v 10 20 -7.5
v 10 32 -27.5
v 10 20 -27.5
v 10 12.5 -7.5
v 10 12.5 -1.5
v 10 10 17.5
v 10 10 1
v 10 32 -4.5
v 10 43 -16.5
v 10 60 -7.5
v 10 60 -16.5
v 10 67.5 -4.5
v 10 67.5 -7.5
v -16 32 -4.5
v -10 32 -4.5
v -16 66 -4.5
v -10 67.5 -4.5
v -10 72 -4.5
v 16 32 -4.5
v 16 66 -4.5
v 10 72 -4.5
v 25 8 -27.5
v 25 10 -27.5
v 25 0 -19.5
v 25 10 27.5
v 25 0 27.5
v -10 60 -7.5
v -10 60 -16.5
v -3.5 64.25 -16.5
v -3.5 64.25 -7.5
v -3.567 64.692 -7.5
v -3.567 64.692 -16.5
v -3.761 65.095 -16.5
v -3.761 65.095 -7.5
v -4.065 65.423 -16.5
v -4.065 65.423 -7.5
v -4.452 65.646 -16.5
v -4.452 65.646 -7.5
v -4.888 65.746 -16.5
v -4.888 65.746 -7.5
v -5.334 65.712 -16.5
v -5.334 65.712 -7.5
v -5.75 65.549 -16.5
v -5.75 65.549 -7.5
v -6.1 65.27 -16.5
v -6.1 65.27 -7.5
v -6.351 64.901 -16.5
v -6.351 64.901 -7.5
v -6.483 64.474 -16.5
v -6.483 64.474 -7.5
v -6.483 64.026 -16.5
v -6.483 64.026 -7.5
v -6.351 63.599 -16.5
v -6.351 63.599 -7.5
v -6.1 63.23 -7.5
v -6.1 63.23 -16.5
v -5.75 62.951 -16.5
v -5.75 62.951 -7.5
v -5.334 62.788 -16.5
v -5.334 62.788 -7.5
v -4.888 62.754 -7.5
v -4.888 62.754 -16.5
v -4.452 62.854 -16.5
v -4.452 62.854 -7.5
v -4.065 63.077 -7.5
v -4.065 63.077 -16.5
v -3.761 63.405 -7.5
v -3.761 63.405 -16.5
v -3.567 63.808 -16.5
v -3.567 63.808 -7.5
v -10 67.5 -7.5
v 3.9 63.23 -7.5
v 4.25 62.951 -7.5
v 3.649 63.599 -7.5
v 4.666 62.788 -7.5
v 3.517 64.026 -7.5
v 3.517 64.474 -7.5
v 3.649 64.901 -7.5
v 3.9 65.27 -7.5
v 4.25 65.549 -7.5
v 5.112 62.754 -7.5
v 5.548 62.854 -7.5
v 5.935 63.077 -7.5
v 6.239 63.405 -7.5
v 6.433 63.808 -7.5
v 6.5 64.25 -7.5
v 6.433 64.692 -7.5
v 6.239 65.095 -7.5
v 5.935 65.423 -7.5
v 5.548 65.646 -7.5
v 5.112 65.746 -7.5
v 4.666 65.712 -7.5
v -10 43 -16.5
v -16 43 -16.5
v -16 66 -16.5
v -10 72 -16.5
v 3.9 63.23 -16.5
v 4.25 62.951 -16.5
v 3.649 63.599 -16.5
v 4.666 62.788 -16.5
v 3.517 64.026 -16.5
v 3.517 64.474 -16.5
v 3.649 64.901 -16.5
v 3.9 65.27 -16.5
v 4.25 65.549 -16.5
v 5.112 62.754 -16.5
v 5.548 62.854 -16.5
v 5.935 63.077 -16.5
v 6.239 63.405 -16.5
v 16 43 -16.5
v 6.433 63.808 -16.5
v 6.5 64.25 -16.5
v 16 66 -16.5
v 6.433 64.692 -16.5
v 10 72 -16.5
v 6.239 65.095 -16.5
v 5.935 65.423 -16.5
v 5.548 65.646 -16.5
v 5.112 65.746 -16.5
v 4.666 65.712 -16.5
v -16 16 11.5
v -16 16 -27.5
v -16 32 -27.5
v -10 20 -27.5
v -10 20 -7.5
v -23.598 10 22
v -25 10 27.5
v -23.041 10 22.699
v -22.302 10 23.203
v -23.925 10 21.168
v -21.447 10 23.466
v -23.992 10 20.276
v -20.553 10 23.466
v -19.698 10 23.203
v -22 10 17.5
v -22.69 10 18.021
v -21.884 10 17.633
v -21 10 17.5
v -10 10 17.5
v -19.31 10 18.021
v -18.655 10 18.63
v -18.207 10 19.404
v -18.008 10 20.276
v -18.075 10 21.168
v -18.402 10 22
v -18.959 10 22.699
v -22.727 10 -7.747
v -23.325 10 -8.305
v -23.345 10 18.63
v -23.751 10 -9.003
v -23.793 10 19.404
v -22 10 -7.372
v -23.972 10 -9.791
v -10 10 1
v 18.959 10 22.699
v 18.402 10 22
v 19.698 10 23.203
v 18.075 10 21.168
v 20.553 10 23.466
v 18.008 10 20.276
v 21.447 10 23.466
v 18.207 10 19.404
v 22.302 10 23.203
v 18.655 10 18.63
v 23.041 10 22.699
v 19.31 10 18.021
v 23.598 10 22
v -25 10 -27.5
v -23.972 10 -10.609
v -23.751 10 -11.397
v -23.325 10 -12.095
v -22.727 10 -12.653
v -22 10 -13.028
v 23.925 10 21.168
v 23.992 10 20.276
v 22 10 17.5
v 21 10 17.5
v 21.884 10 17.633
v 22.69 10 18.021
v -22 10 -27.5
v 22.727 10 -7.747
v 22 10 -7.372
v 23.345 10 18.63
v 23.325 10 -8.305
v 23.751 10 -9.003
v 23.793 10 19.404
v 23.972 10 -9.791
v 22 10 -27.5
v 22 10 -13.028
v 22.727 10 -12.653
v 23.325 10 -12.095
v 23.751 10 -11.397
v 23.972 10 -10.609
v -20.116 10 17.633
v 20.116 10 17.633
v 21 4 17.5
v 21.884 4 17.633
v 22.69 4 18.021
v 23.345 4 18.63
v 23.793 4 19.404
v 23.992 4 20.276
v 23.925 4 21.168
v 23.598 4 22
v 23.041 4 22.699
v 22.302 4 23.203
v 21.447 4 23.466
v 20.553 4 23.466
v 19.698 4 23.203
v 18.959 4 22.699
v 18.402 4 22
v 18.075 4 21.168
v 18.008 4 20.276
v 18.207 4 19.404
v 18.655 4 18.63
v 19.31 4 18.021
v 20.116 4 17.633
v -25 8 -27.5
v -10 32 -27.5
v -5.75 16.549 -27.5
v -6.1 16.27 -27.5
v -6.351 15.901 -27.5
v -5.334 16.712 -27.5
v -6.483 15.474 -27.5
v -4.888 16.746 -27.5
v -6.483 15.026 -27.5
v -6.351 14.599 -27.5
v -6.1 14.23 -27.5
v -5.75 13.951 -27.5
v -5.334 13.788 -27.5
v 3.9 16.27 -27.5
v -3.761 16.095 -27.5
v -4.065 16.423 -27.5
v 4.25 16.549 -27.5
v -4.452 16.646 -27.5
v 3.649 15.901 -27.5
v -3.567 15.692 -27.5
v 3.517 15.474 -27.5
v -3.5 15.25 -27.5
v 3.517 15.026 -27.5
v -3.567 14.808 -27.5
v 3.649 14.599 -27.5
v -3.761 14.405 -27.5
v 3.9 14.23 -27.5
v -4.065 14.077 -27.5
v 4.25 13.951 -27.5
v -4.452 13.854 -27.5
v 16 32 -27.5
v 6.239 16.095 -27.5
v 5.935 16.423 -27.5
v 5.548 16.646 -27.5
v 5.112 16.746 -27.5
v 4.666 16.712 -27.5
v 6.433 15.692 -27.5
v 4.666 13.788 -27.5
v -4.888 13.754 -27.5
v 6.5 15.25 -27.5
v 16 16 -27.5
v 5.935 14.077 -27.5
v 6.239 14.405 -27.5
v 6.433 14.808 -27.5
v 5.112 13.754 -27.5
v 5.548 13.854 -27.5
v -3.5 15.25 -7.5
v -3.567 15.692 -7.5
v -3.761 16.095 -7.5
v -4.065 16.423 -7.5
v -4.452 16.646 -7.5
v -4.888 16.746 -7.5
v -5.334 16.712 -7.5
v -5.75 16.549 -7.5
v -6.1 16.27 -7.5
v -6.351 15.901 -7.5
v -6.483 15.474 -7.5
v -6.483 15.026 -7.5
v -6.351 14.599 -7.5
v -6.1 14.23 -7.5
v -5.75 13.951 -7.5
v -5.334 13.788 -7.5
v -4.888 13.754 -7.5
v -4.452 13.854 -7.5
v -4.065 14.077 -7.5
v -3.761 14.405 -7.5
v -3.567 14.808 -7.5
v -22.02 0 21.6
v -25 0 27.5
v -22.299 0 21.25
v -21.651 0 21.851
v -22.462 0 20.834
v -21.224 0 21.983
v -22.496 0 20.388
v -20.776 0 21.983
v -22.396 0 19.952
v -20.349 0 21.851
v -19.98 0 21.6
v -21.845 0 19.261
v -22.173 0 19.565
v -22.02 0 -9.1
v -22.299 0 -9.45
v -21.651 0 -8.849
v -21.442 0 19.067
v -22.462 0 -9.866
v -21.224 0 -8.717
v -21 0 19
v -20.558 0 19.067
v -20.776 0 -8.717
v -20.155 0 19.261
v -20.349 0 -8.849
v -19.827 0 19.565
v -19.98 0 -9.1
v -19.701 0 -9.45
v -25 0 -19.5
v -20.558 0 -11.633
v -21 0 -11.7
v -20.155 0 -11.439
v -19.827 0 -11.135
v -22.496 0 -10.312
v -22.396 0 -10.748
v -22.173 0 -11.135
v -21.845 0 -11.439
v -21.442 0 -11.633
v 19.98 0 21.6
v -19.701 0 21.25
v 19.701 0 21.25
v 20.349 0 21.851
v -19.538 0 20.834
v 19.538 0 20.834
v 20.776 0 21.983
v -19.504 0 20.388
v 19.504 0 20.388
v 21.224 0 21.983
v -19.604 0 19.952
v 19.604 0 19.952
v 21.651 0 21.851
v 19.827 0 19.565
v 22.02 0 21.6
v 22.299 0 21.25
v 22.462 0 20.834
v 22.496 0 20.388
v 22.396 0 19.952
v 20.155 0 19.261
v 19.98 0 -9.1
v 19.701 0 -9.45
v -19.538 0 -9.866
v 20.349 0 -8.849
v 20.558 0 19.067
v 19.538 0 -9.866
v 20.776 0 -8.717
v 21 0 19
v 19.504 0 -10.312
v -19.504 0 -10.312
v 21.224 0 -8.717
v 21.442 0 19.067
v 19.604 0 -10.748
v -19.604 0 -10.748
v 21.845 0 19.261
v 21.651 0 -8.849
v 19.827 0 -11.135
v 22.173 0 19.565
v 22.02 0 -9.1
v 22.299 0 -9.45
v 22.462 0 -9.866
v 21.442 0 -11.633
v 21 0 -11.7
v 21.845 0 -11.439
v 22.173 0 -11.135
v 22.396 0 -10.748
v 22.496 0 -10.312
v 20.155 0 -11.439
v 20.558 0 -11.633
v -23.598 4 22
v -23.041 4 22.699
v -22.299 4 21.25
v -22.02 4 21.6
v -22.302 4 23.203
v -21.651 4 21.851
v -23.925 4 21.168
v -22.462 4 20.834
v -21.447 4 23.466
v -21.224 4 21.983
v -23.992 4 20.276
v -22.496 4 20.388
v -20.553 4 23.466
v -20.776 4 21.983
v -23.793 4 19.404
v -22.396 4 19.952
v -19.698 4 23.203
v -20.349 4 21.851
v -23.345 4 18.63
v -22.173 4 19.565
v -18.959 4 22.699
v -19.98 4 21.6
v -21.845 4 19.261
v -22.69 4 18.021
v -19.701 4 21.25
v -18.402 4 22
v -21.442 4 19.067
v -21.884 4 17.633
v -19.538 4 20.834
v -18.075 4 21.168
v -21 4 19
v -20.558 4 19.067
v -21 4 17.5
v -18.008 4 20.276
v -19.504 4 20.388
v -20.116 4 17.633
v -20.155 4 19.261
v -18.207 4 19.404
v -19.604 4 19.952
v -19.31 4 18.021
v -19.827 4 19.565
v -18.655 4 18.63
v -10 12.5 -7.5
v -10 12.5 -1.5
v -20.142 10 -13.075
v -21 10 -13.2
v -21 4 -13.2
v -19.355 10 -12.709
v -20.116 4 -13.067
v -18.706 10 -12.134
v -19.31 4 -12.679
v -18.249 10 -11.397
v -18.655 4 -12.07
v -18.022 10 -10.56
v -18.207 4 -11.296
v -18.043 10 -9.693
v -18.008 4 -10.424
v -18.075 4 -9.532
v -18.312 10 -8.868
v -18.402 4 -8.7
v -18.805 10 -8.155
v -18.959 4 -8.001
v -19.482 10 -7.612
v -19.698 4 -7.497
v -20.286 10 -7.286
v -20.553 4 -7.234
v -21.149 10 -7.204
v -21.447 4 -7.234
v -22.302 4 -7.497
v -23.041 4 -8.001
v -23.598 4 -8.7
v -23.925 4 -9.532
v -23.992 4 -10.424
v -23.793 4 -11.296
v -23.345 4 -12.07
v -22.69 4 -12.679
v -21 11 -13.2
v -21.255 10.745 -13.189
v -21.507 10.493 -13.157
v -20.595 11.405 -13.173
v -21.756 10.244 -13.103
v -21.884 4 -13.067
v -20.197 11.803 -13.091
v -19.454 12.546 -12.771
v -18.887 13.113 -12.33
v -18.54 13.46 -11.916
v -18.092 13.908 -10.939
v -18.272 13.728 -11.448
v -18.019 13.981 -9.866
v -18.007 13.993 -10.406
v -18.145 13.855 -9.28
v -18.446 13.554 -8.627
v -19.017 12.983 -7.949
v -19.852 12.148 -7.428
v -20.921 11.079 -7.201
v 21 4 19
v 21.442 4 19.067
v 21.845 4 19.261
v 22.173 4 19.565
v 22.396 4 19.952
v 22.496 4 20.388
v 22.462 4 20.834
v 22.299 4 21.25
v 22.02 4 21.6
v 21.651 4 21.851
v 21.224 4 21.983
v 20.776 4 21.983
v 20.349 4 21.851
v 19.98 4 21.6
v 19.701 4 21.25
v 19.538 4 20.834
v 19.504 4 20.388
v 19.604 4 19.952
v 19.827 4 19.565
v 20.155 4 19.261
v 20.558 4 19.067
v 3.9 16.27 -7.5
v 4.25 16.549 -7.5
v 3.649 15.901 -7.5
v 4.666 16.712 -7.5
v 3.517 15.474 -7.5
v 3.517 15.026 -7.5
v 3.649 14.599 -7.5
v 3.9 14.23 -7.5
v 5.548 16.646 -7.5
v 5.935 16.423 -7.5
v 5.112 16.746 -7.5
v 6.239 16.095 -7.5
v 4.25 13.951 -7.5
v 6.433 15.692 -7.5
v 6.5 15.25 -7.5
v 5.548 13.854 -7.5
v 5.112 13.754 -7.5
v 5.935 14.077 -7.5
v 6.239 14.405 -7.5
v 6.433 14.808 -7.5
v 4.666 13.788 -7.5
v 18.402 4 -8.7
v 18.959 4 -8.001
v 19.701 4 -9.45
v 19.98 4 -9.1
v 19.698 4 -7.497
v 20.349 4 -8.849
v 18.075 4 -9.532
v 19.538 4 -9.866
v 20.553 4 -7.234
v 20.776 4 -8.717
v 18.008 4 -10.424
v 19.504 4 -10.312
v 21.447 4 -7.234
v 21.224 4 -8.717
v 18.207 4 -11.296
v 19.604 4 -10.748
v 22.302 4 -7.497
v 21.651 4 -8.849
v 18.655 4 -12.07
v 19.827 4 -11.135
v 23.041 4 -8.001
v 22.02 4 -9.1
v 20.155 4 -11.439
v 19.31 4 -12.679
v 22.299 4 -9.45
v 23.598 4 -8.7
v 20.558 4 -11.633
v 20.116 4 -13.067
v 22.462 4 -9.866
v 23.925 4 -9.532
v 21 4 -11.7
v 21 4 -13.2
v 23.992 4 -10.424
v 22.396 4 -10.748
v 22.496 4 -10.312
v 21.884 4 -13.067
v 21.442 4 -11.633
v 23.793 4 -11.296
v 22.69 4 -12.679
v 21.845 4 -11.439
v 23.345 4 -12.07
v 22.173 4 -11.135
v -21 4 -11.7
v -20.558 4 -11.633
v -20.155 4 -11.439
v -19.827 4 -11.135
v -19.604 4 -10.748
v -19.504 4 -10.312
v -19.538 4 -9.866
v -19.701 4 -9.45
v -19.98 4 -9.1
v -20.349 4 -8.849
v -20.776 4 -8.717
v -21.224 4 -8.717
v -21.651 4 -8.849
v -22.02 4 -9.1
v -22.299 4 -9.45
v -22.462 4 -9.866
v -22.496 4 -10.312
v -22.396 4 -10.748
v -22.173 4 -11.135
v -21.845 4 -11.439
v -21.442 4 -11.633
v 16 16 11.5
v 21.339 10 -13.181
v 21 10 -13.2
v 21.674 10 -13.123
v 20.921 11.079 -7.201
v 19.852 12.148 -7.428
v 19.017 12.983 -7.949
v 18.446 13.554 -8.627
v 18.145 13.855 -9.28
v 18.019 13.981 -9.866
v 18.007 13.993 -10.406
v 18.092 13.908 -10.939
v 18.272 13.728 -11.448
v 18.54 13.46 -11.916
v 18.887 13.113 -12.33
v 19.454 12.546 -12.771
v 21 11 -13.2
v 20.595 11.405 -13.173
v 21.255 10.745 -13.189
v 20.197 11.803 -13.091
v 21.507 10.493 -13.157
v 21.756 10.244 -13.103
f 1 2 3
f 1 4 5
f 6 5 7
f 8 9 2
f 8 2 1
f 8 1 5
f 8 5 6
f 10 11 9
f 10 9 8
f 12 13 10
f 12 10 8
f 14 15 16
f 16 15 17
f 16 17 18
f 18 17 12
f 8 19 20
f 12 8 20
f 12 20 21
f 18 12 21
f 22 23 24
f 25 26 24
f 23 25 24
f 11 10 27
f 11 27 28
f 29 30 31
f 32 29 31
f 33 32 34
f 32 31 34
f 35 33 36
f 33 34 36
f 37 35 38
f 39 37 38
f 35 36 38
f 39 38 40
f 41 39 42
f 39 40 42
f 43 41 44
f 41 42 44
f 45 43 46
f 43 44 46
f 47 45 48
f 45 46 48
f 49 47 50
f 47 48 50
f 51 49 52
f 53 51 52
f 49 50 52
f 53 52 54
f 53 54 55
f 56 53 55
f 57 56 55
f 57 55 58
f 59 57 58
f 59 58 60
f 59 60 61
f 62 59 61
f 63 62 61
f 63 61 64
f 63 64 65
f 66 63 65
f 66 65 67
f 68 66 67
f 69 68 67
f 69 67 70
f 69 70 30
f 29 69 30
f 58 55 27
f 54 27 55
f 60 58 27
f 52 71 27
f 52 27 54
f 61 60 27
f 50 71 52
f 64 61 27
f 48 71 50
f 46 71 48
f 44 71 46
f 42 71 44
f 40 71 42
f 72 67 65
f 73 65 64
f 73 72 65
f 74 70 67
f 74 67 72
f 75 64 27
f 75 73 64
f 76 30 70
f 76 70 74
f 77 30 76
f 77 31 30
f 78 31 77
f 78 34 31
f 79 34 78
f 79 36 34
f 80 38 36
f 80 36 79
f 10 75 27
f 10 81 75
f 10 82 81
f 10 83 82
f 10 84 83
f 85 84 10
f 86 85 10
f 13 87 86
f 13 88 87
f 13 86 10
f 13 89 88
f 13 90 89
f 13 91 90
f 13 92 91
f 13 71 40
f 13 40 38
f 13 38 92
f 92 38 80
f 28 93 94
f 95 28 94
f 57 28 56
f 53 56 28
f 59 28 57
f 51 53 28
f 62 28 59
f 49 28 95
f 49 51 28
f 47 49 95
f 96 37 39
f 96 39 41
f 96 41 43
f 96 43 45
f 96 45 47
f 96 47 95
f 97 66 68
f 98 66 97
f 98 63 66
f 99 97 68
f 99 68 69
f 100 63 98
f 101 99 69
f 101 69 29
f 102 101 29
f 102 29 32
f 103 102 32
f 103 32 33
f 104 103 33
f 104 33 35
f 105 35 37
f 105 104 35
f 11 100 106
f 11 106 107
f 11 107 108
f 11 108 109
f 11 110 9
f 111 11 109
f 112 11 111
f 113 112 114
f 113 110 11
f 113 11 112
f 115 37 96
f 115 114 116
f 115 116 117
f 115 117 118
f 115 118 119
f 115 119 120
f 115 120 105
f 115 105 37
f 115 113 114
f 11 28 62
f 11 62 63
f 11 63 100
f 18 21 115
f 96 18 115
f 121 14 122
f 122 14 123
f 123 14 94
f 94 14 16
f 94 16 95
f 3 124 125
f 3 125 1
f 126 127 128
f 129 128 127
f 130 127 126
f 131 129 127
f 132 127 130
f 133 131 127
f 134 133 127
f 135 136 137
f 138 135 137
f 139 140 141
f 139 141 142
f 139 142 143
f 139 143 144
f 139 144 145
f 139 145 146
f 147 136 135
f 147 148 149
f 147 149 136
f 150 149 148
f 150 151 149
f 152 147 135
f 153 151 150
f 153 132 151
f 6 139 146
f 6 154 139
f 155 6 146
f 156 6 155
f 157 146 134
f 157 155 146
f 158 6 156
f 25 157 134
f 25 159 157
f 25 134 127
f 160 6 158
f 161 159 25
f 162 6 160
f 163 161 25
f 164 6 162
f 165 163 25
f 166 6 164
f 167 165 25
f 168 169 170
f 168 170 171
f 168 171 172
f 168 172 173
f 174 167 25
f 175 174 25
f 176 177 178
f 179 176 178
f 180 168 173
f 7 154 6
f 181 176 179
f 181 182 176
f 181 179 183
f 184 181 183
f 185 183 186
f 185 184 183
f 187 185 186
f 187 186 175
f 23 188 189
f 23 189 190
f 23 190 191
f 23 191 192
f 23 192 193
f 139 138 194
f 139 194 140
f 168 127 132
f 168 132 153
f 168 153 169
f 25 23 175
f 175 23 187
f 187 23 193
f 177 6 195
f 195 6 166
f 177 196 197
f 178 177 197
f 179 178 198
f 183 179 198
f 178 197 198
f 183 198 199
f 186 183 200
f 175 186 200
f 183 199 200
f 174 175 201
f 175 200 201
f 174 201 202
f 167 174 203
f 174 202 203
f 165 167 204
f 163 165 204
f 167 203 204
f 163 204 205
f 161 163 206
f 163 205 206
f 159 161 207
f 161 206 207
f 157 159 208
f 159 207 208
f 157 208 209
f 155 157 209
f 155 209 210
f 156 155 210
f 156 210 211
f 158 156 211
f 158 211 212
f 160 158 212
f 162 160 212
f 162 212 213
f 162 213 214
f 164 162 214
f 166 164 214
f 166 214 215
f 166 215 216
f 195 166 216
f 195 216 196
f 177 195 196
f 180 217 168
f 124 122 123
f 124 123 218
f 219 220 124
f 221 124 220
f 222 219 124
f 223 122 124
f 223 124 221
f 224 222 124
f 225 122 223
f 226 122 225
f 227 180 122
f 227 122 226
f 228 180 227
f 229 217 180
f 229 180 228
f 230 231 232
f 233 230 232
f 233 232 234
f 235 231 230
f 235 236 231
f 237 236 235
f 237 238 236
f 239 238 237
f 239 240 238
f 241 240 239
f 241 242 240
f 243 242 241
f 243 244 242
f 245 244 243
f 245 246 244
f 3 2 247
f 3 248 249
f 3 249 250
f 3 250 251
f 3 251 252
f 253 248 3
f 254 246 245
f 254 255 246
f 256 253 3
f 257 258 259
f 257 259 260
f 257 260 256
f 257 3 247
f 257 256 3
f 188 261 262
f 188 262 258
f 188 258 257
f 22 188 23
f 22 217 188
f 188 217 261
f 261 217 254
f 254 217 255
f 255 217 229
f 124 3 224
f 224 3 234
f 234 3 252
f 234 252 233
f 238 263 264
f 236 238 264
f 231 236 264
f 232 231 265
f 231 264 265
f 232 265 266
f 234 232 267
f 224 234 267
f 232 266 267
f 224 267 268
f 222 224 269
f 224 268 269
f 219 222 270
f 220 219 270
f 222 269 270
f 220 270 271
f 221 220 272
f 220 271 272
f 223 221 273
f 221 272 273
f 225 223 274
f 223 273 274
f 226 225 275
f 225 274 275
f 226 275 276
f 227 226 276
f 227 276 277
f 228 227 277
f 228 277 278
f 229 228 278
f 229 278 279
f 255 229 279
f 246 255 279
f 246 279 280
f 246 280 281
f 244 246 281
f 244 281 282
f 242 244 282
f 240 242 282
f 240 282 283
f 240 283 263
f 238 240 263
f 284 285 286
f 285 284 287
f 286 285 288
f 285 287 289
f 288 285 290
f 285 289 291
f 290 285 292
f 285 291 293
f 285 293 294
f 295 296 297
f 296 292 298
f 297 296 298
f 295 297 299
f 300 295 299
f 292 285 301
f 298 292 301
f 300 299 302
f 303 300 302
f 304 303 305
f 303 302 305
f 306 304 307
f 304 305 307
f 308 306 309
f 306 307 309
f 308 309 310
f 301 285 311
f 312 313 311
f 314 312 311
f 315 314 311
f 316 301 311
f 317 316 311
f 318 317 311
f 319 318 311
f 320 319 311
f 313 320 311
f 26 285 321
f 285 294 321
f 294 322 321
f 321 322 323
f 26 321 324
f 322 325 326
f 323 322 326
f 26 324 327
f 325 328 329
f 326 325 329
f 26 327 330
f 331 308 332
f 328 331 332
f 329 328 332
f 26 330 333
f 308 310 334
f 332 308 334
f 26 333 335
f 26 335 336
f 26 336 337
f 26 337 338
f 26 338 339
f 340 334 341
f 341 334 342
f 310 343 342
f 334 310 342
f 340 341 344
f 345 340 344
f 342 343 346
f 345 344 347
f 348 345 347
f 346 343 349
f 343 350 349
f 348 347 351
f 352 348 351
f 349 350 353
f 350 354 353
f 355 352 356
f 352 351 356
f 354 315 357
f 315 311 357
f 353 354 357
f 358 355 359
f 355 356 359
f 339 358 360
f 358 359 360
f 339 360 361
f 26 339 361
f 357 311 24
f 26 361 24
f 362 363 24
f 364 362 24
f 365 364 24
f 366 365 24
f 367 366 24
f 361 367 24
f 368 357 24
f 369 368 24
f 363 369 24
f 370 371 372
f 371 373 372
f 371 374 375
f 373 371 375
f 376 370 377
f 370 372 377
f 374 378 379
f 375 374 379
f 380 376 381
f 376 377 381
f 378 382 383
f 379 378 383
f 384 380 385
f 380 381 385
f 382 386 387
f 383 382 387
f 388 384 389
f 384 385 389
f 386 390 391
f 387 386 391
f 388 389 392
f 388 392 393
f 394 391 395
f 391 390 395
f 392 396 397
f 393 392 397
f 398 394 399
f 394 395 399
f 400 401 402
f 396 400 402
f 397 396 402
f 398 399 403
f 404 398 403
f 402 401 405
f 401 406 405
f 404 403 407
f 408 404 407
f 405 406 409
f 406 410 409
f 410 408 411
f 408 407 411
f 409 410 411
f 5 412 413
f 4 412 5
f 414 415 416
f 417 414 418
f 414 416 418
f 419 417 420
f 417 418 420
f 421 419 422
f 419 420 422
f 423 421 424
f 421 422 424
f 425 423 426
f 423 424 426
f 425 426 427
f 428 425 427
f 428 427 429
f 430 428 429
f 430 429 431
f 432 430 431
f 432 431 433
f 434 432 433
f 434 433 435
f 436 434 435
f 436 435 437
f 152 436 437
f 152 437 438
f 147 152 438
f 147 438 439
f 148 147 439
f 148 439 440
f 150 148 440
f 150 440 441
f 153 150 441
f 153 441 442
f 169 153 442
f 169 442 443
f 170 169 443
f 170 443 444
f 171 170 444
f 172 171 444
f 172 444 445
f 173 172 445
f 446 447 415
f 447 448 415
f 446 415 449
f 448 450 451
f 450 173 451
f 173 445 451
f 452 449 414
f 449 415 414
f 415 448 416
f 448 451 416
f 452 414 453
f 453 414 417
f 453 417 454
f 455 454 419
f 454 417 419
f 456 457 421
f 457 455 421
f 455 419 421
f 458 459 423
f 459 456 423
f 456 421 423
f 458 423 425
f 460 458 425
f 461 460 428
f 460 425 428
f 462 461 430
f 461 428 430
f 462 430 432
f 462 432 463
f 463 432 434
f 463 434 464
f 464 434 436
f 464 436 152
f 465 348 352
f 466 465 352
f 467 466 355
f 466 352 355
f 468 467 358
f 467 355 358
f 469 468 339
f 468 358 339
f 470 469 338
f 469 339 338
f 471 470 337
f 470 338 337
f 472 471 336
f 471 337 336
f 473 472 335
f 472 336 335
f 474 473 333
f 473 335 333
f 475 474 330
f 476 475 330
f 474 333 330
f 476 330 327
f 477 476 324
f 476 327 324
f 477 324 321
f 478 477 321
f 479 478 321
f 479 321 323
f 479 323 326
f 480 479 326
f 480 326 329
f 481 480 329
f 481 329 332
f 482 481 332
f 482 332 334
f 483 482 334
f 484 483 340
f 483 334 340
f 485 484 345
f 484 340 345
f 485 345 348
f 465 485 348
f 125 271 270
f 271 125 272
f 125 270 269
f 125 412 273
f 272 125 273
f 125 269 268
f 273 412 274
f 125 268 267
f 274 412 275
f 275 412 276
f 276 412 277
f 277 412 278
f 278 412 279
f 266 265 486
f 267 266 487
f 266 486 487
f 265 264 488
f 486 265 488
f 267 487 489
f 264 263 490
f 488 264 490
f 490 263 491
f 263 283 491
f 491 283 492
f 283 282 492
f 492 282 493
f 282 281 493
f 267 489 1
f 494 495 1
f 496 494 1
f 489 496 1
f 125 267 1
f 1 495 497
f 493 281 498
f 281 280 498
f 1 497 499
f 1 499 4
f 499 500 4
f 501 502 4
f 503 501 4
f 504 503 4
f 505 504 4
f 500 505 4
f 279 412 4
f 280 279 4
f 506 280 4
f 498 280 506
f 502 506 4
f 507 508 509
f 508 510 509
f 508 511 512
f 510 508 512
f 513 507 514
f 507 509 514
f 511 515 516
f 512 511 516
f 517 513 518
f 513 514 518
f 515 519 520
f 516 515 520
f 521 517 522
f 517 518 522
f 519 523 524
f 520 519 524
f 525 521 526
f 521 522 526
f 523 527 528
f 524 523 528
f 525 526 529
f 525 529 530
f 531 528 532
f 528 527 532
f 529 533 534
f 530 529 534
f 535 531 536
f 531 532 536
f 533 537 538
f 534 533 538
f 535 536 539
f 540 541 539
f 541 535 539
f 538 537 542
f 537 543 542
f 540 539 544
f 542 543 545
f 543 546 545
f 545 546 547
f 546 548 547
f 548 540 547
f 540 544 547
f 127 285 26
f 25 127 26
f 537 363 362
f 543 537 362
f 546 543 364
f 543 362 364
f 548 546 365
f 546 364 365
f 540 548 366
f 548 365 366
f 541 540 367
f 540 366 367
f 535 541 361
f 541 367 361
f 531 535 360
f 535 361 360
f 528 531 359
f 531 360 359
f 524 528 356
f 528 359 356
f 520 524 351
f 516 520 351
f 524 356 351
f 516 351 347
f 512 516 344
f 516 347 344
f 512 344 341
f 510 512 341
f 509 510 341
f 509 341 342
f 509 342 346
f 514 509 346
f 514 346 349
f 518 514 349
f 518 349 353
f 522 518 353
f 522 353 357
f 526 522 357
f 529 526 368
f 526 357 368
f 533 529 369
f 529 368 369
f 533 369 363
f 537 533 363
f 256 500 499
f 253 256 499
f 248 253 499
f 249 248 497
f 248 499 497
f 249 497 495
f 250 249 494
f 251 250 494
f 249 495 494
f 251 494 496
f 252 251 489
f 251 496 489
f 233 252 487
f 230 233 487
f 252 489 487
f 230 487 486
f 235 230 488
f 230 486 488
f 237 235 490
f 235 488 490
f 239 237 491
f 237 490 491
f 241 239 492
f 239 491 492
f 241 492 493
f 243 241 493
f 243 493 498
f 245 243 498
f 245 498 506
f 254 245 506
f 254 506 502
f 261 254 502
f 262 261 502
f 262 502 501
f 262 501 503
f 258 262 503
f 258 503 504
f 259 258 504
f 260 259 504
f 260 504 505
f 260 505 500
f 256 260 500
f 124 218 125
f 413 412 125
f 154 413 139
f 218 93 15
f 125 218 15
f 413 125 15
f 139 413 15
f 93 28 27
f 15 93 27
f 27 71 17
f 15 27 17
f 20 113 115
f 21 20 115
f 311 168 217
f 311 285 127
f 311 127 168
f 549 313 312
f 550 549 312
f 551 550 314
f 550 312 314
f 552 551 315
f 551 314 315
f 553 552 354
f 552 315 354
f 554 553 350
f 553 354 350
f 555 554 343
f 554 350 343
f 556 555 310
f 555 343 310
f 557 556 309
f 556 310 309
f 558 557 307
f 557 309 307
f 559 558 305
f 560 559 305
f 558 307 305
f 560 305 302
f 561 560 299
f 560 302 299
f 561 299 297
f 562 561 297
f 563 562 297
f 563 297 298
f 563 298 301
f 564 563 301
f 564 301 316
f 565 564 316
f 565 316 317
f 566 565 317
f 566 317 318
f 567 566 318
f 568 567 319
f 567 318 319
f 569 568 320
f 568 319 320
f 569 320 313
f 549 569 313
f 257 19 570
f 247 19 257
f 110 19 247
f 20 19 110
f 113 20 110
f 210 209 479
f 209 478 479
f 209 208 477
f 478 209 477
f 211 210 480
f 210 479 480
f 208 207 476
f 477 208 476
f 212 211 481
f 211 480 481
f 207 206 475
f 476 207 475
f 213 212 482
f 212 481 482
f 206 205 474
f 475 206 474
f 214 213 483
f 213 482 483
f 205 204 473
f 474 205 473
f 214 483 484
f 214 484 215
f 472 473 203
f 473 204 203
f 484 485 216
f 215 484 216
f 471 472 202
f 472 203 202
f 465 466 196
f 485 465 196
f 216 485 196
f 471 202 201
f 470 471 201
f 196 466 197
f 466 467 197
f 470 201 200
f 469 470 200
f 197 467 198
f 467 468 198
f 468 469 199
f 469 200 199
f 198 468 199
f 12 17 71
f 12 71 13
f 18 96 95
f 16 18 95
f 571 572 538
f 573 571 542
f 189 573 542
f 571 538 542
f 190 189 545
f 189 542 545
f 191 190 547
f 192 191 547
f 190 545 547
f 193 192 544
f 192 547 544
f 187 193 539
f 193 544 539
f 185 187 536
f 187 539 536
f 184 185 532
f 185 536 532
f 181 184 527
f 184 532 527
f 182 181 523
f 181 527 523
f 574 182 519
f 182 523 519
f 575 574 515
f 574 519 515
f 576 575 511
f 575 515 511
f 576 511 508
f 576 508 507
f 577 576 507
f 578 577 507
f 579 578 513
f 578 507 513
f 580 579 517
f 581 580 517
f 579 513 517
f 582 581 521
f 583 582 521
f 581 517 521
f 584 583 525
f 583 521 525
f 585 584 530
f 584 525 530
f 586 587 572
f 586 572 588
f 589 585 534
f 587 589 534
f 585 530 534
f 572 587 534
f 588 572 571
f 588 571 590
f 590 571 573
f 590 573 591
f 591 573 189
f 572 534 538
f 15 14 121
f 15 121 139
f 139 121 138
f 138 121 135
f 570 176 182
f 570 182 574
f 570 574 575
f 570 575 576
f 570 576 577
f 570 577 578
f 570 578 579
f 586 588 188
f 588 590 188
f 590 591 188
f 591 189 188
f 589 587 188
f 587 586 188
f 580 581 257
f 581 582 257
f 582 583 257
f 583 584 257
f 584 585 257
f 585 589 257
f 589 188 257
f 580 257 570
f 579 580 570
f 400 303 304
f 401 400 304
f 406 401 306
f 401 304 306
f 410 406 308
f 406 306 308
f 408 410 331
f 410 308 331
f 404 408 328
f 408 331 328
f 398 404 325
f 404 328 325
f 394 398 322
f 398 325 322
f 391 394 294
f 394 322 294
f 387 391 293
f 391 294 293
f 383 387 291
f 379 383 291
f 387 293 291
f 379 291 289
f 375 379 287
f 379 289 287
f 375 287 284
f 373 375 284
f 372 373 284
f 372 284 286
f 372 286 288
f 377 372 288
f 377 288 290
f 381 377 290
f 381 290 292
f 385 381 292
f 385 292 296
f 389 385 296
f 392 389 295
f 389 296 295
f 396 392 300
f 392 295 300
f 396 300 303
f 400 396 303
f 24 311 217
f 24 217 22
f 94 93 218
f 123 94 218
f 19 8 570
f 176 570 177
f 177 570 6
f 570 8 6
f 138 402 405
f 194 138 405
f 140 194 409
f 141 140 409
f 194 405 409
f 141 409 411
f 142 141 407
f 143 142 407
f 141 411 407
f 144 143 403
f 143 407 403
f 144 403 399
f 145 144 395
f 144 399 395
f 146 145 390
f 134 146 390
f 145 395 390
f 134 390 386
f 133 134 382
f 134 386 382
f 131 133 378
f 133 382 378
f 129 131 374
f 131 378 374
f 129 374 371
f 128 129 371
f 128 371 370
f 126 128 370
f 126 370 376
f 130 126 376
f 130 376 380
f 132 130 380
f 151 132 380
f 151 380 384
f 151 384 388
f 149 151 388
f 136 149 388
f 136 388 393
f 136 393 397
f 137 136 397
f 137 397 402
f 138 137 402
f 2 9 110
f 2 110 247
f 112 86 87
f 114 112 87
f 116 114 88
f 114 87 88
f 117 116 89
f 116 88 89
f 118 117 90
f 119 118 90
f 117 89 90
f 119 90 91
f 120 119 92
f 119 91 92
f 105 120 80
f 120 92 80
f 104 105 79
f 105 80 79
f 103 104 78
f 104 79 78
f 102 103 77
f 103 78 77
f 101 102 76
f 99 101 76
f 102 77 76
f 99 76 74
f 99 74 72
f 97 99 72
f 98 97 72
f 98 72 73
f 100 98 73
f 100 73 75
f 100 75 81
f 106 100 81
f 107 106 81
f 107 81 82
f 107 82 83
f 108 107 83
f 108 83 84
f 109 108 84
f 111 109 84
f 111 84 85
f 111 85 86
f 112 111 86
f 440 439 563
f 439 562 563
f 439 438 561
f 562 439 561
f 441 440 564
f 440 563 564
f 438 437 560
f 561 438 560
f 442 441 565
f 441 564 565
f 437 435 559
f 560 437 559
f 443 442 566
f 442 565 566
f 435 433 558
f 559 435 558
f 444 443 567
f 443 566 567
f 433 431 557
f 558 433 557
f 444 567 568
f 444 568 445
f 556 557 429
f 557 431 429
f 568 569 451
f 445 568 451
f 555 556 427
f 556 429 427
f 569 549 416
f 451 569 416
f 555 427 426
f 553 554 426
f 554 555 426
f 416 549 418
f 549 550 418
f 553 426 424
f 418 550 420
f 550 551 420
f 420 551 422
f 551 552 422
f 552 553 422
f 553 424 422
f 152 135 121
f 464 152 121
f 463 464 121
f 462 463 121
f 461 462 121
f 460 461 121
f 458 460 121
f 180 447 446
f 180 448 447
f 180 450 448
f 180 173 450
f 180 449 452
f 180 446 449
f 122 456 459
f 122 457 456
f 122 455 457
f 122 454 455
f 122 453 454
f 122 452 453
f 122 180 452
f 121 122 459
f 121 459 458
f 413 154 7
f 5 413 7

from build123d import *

# Parameters (mm, degrees)
SKETCH1_W           = 50
SKETCH1_H           = 55
BOSS_EXTRUDE1_DEPTH = 10
SKETCH2_R           = 1.5
CUT_EXTRUDE1_DEPTH  = 4
CUT_EXTRUDE2_REACH  = 39.646
SKETCH3_R           = 3
SKETCH4_W           = 20
SKETCH4_H           = 20
BOSS_EXTRUDE2_DEPTH = 10
BOSS_EXTRUDE3_DEPTH = 6
SKETCH6_W           = 12
SKETCH6_H           = 12
BOSS_EXTRUDE4_DEPTH = 32
SKETCH7_W           = 20
SKETCH7_H           = 2.5
BOSS_EXTRUDE5_DEPTH = 6
SKETCH8_W           = 20
SKETCH8_H           = 7.5
CUT_EXTRUDE3_DEPTH  = 3
CHAMFER1_SIZE       = 2.5
CUT_EXTRUDE4_REACH  = 85.869
SKETCH9_R           = 1.5
CHAMFER3_SIZE       = 6
CHAMFER4_SIZE       = 8


# Some blends are built 0.0001 mm under size
with BuildPart() as part:
    # Sketch1 → Boss-Extrude1 (new body)
    with BuildSketch(Plane(origin=(0, 0, 0), x_dir=(1, 0, 0), z_dir=(0, 1, 0))):
        Rectangle(SKETCH1_W, SKETCH1_H)
    extrude(amount=BOSS_EXTRUDE1_DEPTH)

    # Sketch2 → Cut-Extrude1 (cut)
    with BuildSketch(Plane.XZ):
        with Locations(Location((-21, 20.5, 0), (0, 0, 270))):
            Circle(SKETCH2_R)
        with Locations(Location((21, 20.5, 0), (0, 0, 270))):
            Circle(SKETCH2_R)
        with Locations(Location((21, -10.2, 0), (0, 0, 270))):
            Circle(SKETCH2_R)
        with Locations(Location((-21, -10.2, 0), (0, 0, 270))):
            Circle(SKETCH2_R)
    extrude(amount=-CUT_EXTRUDE1_DEPTH, mode=Mode.SUBTRACT)

    # Sketch3 → Cut-Extrude2 (cut, up to next)
    with BuildSketch(Plane.XZ.offset(-4), mode=Mode.PRIVATE) as cut_extrude2_sk1:
        with Locations(Location((-21, 20.5, 0), (0, 0, 270))):
            Circle(SKETCH3_R)
    cut_extrude2_tool1 = extrude(cut_extrude2_sk1.sketch, amount=-CUT_EXTRUDE2_REACH, mode=Mode.PRIVATE) & part.part
    # Sketch3 → Cut-Extrude2 (cut, up to next)
    with BuildSketch(Plane.XZ.offset(-4), mode=Mode.PRIVATE) as cut_extrude2_sk2:
        with Locations(Location((21, 20.5, 0), (0, 0, 270))):
            Circle(SKETCH3_R)
    cut_extrude2_tool2 = extrude(cut_extrude2_sk2.sketch, amount=-CUT_EXTRUDE2_REACH, mode=Mode.PRIVATE) & part.part
    # Sketch3 → Cut-Extrude2 (cut, up to next)
    with BuildSketch(Plane.XZ.offset(-4), mode=Mode.PRIVATE) as cut_extrude2_sk3:
        with Locations(Location((21, -10.2, 0), (0, 0, 270))):
            Circle(SKETCH3_R)
    cut_extrude2_tool3 = extrude(cut_extrude2_sk3.sketch, amount=-CUT_EXTRUDE2_REACH, mode=Mode.PRIVATE) & part.part
    # Sketch3 → Cut-Extrude2 (cut, up to next)
    with BuildSketch(Plane.XZ.offset(-4), mode=Mode.PRIVATE) as cut_extrude2_sk4:
        with Locations(Location((-21, -10.2, 0), (0, 0, 270))):
            Circle(SKETCH3_R)
    cut_extrude2_tool4 = extrude(cut_extrude2_sk4.sketch, amount=-CUT_EXTRUDE2_REACH, mode=Mode.PRIVATE) & part.part
    add(cut_extrude2_tool1.solids().sort_by_distance((-21, 4, 20.5))[0], mode=Mode.SUBTRACT)
    add(cut_extrude2_tool2.solids().sort_by_distance((21, 4, 20.5))[0], mode=Mode.SUBTRACT)
    add(cut_extrude2_tool3.solids().sort_by_distance((21, 4, -10.2))[0], mode=Mode.SUBTRACT)
    add(cut_extrude2_tool4.solids().sort_by_distance((-21, 4, -10.2))[0], mode=Mode.SUBTRACT)

    # Sketch4 → Boss-Extrude2 (add)
    with BuildSketch(Plane(origin=(0, 10, 0), x_dir=(1, 0, 0), z_dir=(0, 1, 0))):
        with Locations((0, 17.5)):
            Rectangle(SKETCH4_W, SKETCH4_H)
    extrude(amount=BOSS_EXTRUDE2_DEPTH)

    # Sketch5 → Boss-Extrude3 (add)
    with BuildSketch(Plane(origin=(10, 0, 0), x_dir=(0, 0, -1), z_dir=(1, 0, 0))):
        Polygon((-17.5, 10), (4.5, 32), (4.5, 60), (16.5, 60), (16.5, 43), (27.5, 32), (27.5, 10), align=None)
    boss_extrude3 = extrude(amount=BOSS_EXTRUDE3_DEPTH)

    # Mirror1: Boss-Extrude3 across plane
    add(boss_extrude3.mirror(Plane(origin=(0, 0, 0), x_dir=(0, 0, 1), z_dir=(1, 0, 0))))

    # Sketch6 → Boss-Extrude4 (add)
    with BuildSketch(Plane(origin=(16, 0, 0), x_dir=(0, 0, -1), z_dir=(1, 0, 0))):
        with Locations((10.5, 66)):
            Rectangle(SKETCH6_W, SKETCH6_H)
    extrude(amount=-BOSS_EXTRUDE4_DEPTH)

    # Sketch7 → Boss-Extrude5 (add)
    with BuildSketch(Plane.XY.offset(-7.5)):
        with Locations((0, 11.25)):
            Rectangle(SKETCH7_W, SKETCH7_H)
    extrude(amount=BOSS_EXTRUDE5_DEPTH)

    # Sketch8 → Cut-Extrude3 (cut)
    with BuildSketch(Plane.XY.offset(-4.5)):
        with Locations((0, 63.75)):
            Rectangle(SKETCH8_W, SKETCH8_H)
    extrude(amount=-CUT_EXTRUDE3_DEPTH, mode=Mode.SUBTRACT)

    # Chamfer1
    chamfer1_edges = [part.edges().sort_by_distance(p)[0] for p in [
        (0, 10, -1.5),
    ]]
    chamfer(chamfer1_edges, length=CHAMFER1_SIZE - 0.0001)  # a hair under: the kernel refuses the full size

    # Sketch9 → Cut-Extrude4 (cut, up to next)
    with BuildSketch(Plane.XY.offset(-7.5), mode=Mode.PRIVATE) as cut_extrude4_sk1:
        with Locations((-5, 64.25)):
            Circle(SKETCH9_R)
    cut_extrude4_tool1 = extrude(cut_extrude4_sk1.sketch, amount=-CUT_EXTRUDE4_REACH, mode=Mode.PRIVATE) & part.part
    # Sketch9 → Cut-Extrude4 (cut, up to next)
    with BuildSketch(Plane.XY.offset(-7.5), mode=Mode.PRIVATE) as cut_extrude4_sk2:
        with Locations((5, 64.25)):
            Circle(SKETCH9_R)
    cut_extrude4_tool2 = extrude(cut_extrude4_sk2.sketch, amount=-CUT_EXTRUDE4_REACH, mode=Mode.PRIVATE) & part.part
    # Sketch9 → Cut-Extrude4 (cut, up to next)
    with BuildSketch(Plane.XY.offset(-7.5), mode=Mode.PRIVATE) as cut_extrude4_sk3:
        with Locations((5, 15.25)):
            Circle(SKETCH9_R)
    cut_extrude4_tool3 = extrude(cut_extrude4_sk3.sketch, amount=-CUT_EXTRUDE4_REACH, mode=Mode.PRIVATE) & part.part
    # Sketch9 → Cut-Extrude4 (cut, up to next)
    with BuildSketch(Plane.XY.offset(-7.5), mode=Mode.PRIVATE) as cut_extrude4_sk4:
        with Locations((-5, 15.25)):
            Circle(SKETCH9_R)
    cut_extrude4_tool4 = extrude(cut_extrude4_sk4.sketch, amount=-CUT_EXTRUDE4_REACH, mode=Mode.PRIVATE) & part.part
    add(cut_extrude4_tool1.solids().sort_by_distance((-5, 64.25, -7.5))[0], mode=Mode.SUBTRACT)
    add(cut_extrude4_tool2.solids().sort_by_distance((5, 64.25, -7.5))[0], mode=Mode.SUBTRACT)
    add(cut_extrude4_tool3.solids().sort_by_distance((5, 15.25, -7.5))[0], mode=Mode.SUBTRACT)
    add(cut_extrude4_tool4.solids().sort_by_distance((-5, 15.25, -7.5))[0], mode=Mode.SUBTRACT)

    # Chamfer3
    # the kernel refuses this chamfer: 6 mm, written as the material it adds along each edge
    with BuildSketch(Plane(origin=(16, 10, -27.5), x_dir=(0.9996219169112969, -0.02749587661058649, 0), z_dir=(0, 0, 1))) as chamfer3_piece_1_section:
        Polygon((CHAMFER3_SIZE * 0.999621916911, CHAMFER3_SIZE * 0.0274958766106), (-CHAMFER3_SIZE * 0.0274958766106, CHAMFER3_SIZE * 0.999621916911), (0, 0), align=None)
    chamfer3_piece_1 = extrude(amount=60.430097928, mode=Mode.PRIVATE)
    chamfer3_piece_1 = split(chamfer3_piece_1, bisect_by=Plane(origin=(17.926096491, 22.613963147, 4.886036853), z_dir=(0, -0.7071067811865474, -0.7071067811865478)), keep=Keep.TOP, mode=Mode.PRIVATE)
    chamfer3_piece_1 = chamfer3_piece_1 - Plane(origin=(21, 11.966350777, 20.5), x_dir=(0, 0, -1), z_dir=(0, -1, 0)) * Cylinder(3, 145, mode=Mode.PRIVATE)
    chamfer3_piece_1 = chamfer3_piece_1 - Plane(origin=(21, 11.966350777, -10.2), x_dir=(0, 0, -1), z_dir=(0, -1, 0)) * Cylinder(3, 145, mode=Mode.PRIVATE)
    add(chamfer3_piece_1)
    with BuildSketch(Plane(origin=(-16, 10, -27.5), x_dir=(-0.9996219169112969, -0.02749587661058649, 0), z_dir=(0, 0, 1))) as chamfer3_piece_2_section:
        Polygon((CHAMFER3_SIZE * 0.999621916911, -CHAMFER3_SIZE * 0.0274958766106), (-CHAMFER3_SIZE * 0.0274958766106, -CHAMFER3_SIZE * 0.999621916911), (0, 0), align=None)
    chamfer3_piece_2 = extrude(amount=60.430097928, mode=Mode.PRIVATE)
    chamfer3_piece_2 = split(chamfer3_piece_2, bisect_by=Plane(origin=(-17.926096431, 22.613963068, 4.886036932), z_dir=(0, -0.7071067811865474, -0.7071067811865478)), keep=Keep.TOP, mode=Mode.PRIVATE)
    chamfer3_piece_2 = chamfer3_piece_2 - Plane(origin=(-21, 11.966350831, 20.5), x_dir=(0, 0, -1), z_dir=(0, -1, 0)) * Cylinder(3, 145, mode=Mode.PRIVATE)
    chamfer3_piece_2 = chamfer3_piece_2 - Plane(origin=(-21, 11.966350831, -10.2), x_dir=(0, 0, -1), z_dir=(0, -1, 0)) * Cylinder(3, 145, mode=Mode.PRIVATE)
    add(chamfer3_piece_2)
    # the kernel refuses this chamfer: 6 mm, written as the material it takes off along each edge
    with BuildSketch(Plane(origin=(16, 72, -31.930097928), x_dir=(0.02749587661058648, -0.9996219169112968, 0), z_dir=(0, 0, 1)), Plane(origin=(-16, 72, -31.930097928), x_dir=(0.9996219169112968, 0.027495876610586775, 0), z_dir=(0, 0, 1))) as chamfer3_2_piece_1:
        Polygon((CHAMFER3_SIZE * 0.999621916911, -CHAMFER3_SIZE * 0.0274958766106), (-CHAMFER3_SIZE * 0.0274958766106, -CHAMFER3_SIZE * 0.999621916911), (0, 0), align=None)
    extrude(amount=42.860195856, mode=Mode.SUBTRACT)

    # Chamfer4
    chamfer4_edges = [part.edges().sort_by_distance(p)[0] for p in [
        (0, 0, -27.5),
    ]]
    chamfer(chamfer4_edges, length=CHAMFER4_SIZE)


solid = part.part
